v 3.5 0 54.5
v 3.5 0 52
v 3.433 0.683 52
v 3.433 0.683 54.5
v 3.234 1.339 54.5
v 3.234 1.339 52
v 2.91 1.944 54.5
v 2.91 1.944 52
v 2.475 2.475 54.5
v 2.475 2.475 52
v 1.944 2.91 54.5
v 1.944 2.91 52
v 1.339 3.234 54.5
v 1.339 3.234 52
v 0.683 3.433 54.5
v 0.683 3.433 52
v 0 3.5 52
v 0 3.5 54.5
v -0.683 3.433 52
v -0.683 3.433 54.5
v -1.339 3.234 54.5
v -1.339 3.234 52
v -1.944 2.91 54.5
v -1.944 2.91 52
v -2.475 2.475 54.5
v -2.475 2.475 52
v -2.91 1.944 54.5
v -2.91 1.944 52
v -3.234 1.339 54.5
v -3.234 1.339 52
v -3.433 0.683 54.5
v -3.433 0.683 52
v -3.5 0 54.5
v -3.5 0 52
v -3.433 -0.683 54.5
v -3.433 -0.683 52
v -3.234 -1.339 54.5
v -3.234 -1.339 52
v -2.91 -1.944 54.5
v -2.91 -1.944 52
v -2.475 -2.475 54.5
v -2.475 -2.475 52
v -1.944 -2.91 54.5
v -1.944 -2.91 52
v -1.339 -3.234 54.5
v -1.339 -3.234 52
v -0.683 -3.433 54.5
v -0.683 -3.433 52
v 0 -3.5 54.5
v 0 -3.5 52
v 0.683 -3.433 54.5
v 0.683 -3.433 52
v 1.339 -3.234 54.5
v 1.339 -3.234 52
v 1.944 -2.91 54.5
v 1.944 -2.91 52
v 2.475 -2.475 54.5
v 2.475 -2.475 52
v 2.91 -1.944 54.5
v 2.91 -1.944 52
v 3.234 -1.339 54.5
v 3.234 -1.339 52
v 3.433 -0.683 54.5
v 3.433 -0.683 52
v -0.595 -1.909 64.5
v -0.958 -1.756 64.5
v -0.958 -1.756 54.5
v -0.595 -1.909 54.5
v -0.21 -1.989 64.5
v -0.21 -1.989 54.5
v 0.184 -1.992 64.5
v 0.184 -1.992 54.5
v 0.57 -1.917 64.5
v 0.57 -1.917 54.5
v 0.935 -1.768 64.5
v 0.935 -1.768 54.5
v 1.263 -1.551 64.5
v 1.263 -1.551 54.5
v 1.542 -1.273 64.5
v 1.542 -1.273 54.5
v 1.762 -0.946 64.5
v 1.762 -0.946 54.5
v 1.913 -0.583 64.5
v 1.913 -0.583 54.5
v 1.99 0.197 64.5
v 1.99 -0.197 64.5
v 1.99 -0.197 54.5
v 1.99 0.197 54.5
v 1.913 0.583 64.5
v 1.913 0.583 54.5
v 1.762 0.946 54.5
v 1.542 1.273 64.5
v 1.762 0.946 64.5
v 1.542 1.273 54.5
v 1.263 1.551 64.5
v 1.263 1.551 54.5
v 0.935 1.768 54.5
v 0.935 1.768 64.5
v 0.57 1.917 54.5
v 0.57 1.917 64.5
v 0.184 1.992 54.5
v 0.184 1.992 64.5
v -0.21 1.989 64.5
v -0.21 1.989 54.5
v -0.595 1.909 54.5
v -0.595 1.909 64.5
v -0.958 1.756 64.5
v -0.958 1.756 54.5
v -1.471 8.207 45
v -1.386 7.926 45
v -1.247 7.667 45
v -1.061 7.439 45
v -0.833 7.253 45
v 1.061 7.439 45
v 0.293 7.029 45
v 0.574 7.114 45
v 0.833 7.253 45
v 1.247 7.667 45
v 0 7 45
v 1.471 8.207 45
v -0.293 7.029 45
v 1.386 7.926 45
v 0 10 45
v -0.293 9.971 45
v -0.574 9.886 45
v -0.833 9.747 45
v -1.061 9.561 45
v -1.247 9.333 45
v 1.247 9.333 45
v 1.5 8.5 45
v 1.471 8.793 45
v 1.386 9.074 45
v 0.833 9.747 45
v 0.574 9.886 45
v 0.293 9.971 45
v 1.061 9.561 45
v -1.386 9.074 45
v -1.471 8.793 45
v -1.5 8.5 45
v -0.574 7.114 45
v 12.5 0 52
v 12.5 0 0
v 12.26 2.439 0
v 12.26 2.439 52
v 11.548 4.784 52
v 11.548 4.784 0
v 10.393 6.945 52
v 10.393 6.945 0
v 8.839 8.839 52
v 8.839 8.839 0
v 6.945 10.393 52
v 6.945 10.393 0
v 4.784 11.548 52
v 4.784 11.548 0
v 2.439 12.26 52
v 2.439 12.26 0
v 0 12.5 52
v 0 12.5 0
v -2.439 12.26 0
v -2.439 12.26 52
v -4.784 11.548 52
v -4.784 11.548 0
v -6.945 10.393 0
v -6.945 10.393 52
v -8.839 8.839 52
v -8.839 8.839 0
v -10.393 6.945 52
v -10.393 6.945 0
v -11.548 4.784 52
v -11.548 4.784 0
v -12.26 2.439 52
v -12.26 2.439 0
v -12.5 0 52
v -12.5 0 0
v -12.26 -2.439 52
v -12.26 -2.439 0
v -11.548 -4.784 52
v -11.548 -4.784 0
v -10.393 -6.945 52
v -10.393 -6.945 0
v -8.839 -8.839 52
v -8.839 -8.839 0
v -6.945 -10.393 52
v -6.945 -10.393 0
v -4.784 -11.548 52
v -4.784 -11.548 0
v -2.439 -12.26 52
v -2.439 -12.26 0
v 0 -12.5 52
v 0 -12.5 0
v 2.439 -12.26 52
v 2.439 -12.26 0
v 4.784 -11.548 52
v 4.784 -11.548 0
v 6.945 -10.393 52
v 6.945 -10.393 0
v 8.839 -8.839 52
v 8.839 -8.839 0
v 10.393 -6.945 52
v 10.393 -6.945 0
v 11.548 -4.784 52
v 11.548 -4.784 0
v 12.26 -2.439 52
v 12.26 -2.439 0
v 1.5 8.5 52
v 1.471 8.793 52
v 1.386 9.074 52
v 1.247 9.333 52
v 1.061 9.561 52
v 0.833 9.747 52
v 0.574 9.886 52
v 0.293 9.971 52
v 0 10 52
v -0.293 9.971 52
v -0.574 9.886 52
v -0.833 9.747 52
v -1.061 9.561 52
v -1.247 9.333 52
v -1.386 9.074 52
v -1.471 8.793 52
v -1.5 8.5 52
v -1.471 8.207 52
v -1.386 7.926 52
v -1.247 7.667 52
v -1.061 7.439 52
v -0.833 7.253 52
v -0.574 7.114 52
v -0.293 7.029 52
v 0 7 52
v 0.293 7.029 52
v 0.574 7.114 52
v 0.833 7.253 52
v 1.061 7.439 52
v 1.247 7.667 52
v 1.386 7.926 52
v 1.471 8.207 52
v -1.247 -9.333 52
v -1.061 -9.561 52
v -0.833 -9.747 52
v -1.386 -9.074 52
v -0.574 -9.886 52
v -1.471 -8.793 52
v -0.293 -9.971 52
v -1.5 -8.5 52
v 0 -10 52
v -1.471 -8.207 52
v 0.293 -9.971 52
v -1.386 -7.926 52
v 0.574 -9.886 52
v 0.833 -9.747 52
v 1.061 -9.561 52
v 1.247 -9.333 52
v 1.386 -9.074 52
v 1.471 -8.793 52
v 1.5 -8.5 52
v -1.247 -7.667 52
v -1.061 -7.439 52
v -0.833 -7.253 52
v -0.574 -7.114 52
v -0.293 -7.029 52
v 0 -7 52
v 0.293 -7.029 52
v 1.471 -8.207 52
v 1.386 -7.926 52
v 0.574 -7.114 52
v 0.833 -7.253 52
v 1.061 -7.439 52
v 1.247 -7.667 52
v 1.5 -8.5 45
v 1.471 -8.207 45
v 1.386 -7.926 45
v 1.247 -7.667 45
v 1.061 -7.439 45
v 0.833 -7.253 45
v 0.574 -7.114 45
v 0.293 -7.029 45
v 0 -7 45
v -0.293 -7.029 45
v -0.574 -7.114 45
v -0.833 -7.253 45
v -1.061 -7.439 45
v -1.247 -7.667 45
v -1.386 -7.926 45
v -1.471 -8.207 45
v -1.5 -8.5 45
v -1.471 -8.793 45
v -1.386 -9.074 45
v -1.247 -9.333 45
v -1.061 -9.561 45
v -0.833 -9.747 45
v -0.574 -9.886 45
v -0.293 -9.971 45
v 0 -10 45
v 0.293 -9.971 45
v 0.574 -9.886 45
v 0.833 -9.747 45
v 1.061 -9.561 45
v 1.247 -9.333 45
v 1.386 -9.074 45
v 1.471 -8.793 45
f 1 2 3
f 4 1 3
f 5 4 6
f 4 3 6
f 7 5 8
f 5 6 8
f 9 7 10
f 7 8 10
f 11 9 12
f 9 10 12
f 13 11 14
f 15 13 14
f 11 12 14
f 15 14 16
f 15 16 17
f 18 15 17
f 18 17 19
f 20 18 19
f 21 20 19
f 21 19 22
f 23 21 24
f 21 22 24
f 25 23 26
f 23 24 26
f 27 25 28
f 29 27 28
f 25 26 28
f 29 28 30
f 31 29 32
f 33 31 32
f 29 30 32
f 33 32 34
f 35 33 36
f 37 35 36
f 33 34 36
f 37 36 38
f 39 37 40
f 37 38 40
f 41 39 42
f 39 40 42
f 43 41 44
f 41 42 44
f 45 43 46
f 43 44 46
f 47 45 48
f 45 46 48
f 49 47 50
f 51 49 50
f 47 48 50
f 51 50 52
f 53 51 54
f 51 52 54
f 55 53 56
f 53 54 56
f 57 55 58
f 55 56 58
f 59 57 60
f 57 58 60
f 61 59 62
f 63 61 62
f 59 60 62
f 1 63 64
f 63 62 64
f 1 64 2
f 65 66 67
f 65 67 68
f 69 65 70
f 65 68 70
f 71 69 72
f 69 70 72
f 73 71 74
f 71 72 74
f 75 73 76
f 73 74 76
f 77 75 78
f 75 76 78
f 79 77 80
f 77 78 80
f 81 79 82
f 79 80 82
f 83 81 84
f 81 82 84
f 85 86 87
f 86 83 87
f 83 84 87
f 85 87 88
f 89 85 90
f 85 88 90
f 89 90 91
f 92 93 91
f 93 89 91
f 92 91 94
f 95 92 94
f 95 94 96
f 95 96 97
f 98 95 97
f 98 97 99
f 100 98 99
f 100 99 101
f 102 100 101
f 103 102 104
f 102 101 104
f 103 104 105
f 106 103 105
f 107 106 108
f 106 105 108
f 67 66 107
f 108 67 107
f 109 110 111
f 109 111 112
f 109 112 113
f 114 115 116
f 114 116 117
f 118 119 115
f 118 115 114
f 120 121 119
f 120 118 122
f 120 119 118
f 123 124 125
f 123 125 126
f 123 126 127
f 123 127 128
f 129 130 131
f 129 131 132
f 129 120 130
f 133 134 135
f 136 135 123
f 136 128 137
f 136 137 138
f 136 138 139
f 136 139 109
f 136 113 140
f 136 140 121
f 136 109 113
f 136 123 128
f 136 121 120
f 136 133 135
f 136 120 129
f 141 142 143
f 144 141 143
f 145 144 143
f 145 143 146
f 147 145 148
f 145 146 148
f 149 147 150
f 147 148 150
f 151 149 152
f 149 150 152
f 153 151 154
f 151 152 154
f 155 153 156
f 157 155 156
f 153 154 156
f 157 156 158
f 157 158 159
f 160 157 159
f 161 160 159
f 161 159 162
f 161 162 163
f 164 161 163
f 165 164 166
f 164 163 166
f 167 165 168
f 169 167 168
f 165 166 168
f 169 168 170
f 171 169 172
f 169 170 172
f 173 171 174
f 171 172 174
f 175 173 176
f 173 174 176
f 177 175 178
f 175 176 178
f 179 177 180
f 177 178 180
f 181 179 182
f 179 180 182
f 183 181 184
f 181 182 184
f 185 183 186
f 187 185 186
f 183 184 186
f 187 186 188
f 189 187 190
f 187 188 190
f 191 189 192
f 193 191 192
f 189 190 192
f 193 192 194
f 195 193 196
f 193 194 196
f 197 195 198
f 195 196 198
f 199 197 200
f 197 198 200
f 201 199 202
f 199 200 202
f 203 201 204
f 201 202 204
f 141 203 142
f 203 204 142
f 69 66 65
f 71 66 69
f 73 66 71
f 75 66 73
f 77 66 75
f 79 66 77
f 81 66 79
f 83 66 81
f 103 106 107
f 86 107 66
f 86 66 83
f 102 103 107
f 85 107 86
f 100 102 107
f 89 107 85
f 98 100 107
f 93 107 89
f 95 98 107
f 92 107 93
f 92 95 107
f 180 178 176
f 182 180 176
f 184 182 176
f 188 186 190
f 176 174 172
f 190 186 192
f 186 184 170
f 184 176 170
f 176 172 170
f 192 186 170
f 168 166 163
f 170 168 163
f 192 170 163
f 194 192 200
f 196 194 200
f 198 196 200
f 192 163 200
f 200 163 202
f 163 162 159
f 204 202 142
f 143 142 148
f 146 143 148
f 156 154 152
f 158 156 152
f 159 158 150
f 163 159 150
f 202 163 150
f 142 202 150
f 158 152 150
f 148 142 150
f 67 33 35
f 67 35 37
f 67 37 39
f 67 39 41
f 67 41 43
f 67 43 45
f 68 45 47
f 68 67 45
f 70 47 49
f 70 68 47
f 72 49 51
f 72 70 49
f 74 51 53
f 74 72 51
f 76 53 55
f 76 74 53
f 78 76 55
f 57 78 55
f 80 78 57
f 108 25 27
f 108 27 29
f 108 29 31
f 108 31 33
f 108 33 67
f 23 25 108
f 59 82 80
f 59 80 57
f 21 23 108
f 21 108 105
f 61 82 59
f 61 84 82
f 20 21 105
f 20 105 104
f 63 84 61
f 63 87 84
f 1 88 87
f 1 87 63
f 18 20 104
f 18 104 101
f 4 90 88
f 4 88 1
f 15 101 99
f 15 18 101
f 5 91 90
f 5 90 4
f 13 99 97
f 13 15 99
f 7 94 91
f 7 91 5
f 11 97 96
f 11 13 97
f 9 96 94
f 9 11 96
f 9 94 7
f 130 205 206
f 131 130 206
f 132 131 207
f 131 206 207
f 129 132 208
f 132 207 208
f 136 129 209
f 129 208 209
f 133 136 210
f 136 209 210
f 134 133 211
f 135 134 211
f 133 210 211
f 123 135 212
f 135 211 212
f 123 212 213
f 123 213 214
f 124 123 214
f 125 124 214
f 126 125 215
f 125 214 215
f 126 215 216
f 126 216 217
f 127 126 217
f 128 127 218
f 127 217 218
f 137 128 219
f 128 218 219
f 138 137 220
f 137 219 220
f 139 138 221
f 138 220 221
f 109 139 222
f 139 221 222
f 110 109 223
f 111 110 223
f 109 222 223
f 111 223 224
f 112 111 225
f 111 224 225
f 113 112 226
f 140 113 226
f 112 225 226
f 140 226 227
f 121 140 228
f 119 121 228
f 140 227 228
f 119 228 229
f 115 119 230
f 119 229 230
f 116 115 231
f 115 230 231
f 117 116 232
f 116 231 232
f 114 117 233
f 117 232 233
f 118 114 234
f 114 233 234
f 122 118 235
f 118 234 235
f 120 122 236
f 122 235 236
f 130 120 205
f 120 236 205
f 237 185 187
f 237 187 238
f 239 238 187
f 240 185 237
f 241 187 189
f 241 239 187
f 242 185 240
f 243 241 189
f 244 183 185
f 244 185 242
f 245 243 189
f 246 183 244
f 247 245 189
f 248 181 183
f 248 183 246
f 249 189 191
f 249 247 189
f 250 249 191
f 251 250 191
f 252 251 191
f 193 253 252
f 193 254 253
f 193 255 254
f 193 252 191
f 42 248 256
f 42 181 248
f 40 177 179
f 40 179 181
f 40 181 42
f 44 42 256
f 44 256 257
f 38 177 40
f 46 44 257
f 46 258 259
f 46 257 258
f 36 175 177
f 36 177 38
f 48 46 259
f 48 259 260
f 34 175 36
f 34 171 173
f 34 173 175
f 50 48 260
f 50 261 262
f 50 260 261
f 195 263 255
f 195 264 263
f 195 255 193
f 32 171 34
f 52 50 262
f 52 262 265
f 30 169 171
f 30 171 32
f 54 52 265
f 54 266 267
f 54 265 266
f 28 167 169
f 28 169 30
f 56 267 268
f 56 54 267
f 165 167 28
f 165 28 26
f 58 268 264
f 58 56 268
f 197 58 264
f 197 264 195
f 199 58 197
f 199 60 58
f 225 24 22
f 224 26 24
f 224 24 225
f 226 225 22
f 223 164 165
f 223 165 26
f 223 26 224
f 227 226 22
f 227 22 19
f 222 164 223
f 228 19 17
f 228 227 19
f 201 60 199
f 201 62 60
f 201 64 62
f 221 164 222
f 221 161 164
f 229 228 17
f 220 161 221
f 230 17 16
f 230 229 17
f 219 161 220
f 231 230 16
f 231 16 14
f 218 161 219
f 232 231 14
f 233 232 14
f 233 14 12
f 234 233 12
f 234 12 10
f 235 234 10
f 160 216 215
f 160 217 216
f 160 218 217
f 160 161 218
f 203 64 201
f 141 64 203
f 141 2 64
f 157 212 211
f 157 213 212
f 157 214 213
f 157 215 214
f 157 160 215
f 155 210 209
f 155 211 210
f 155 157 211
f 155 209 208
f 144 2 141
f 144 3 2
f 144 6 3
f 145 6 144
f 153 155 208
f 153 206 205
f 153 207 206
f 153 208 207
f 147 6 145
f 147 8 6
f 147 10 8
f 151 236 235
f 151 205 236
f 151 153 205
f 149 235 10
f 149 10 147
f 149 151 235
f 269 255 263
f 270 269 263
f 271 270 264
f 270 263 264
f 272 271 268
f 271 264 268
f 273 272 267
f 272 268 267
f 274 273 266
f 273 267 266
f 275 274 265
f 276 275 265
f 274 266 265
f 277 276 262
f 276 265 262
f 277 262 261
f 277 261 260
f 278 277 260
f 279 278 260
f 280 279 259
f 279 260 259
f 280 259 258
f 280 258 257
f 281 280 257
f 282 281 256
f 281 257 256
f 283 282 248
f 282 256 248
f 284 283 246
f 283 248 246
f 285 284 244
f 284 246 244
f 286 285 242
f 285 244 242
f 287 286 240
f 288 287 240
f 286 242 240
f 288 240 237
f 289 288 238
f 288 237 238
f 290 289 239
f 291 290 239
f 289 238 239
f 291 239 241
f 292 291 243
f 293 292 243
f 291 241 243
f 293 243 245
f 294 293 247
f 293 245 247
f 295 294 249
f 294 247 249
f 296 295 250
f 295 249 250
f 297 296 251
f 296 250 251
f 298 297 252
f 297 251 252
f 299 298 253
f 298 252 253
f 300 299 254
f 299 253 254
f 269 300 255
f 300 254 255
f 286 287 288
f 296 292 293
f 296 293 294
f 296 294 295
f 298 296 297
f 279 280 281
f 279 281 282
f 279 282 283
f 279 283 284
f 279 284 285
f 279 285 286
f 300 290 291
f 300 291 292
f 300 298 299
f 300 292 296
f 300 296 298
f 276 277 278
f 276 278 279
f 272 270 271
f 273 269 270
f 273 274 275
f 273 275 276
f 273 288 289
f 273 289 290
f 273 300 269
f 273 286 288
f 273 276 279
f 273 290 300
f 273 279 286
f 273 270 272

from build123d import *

# Parameters (mm, degrees)
SKETCH_1_R          = 12.5
EXTRUDE_1_DEPTH     = 52
SKETCH_2_R          = 3.5
EXTRUDE_2_DEPTH     = 2.5
SKETCH_3_R          = 2
EXTRUDE_3_DEPTH     = 10
CUT_EXTRUDE_1_DEPTH = 10
SKETCH_5_R          = 1.5
CUT_EXTRUDE_2_DEPTH = 7


with BuildPart() as part:
    # 草图1 → 凸台-拉伸1 (new body)
    with BuildSketch(Plane.XY):
        Circle(SKETCH_1_R)
    extrude(amount=EXTRUDE_1_DEPTH)

    # 草图2 → 凸台-拉伸2 (add)
    with BuildSketch(Plane.XY.offset(52)):
        Circle(SKETCH_2_R)
    extrude(amount=EXTRUDE_2_DEPTH)

    # 草图3 → 凸台-拉伸3 (add)
    with BuildSketch(Plane.XY.offset(54.5)):
        Circle(SKETCH_3_R)
    extrude(amount=EXTRUDE_3_DEPTH)

    # 草图4 → 切除-拉伸1 (cut)
    with BuildSketch(Plane.XY.offset(64.5)):
        with BuildLine():
            Line((-0.957908231, -1.755679874), (-0.957908231, 1.755679874))
            ThreePointArc((-0.957908231, 1.755679874), (-2, 0), (-0.957908231, -1.755679874))
        make_face()
    extrude(amount=-CUT_EXTRUDE_1_DEPTH, mode=Mode.SUBTRACT)

    # 草图5 → 切除-拉伸2 (cut)
    with BuildSketch(Plane.XY.offset(52)):
        with Locations((0, 8.5)):
            Circle(SKETCH_5_R)
        with Locations((0, -8.5)):
            Circle(SKETCH_5_R)
    extrude(amount=-CUT_EXTRUDE_2_DEPTH, mode=Mode.SUBTRACT)


solid = part.part
